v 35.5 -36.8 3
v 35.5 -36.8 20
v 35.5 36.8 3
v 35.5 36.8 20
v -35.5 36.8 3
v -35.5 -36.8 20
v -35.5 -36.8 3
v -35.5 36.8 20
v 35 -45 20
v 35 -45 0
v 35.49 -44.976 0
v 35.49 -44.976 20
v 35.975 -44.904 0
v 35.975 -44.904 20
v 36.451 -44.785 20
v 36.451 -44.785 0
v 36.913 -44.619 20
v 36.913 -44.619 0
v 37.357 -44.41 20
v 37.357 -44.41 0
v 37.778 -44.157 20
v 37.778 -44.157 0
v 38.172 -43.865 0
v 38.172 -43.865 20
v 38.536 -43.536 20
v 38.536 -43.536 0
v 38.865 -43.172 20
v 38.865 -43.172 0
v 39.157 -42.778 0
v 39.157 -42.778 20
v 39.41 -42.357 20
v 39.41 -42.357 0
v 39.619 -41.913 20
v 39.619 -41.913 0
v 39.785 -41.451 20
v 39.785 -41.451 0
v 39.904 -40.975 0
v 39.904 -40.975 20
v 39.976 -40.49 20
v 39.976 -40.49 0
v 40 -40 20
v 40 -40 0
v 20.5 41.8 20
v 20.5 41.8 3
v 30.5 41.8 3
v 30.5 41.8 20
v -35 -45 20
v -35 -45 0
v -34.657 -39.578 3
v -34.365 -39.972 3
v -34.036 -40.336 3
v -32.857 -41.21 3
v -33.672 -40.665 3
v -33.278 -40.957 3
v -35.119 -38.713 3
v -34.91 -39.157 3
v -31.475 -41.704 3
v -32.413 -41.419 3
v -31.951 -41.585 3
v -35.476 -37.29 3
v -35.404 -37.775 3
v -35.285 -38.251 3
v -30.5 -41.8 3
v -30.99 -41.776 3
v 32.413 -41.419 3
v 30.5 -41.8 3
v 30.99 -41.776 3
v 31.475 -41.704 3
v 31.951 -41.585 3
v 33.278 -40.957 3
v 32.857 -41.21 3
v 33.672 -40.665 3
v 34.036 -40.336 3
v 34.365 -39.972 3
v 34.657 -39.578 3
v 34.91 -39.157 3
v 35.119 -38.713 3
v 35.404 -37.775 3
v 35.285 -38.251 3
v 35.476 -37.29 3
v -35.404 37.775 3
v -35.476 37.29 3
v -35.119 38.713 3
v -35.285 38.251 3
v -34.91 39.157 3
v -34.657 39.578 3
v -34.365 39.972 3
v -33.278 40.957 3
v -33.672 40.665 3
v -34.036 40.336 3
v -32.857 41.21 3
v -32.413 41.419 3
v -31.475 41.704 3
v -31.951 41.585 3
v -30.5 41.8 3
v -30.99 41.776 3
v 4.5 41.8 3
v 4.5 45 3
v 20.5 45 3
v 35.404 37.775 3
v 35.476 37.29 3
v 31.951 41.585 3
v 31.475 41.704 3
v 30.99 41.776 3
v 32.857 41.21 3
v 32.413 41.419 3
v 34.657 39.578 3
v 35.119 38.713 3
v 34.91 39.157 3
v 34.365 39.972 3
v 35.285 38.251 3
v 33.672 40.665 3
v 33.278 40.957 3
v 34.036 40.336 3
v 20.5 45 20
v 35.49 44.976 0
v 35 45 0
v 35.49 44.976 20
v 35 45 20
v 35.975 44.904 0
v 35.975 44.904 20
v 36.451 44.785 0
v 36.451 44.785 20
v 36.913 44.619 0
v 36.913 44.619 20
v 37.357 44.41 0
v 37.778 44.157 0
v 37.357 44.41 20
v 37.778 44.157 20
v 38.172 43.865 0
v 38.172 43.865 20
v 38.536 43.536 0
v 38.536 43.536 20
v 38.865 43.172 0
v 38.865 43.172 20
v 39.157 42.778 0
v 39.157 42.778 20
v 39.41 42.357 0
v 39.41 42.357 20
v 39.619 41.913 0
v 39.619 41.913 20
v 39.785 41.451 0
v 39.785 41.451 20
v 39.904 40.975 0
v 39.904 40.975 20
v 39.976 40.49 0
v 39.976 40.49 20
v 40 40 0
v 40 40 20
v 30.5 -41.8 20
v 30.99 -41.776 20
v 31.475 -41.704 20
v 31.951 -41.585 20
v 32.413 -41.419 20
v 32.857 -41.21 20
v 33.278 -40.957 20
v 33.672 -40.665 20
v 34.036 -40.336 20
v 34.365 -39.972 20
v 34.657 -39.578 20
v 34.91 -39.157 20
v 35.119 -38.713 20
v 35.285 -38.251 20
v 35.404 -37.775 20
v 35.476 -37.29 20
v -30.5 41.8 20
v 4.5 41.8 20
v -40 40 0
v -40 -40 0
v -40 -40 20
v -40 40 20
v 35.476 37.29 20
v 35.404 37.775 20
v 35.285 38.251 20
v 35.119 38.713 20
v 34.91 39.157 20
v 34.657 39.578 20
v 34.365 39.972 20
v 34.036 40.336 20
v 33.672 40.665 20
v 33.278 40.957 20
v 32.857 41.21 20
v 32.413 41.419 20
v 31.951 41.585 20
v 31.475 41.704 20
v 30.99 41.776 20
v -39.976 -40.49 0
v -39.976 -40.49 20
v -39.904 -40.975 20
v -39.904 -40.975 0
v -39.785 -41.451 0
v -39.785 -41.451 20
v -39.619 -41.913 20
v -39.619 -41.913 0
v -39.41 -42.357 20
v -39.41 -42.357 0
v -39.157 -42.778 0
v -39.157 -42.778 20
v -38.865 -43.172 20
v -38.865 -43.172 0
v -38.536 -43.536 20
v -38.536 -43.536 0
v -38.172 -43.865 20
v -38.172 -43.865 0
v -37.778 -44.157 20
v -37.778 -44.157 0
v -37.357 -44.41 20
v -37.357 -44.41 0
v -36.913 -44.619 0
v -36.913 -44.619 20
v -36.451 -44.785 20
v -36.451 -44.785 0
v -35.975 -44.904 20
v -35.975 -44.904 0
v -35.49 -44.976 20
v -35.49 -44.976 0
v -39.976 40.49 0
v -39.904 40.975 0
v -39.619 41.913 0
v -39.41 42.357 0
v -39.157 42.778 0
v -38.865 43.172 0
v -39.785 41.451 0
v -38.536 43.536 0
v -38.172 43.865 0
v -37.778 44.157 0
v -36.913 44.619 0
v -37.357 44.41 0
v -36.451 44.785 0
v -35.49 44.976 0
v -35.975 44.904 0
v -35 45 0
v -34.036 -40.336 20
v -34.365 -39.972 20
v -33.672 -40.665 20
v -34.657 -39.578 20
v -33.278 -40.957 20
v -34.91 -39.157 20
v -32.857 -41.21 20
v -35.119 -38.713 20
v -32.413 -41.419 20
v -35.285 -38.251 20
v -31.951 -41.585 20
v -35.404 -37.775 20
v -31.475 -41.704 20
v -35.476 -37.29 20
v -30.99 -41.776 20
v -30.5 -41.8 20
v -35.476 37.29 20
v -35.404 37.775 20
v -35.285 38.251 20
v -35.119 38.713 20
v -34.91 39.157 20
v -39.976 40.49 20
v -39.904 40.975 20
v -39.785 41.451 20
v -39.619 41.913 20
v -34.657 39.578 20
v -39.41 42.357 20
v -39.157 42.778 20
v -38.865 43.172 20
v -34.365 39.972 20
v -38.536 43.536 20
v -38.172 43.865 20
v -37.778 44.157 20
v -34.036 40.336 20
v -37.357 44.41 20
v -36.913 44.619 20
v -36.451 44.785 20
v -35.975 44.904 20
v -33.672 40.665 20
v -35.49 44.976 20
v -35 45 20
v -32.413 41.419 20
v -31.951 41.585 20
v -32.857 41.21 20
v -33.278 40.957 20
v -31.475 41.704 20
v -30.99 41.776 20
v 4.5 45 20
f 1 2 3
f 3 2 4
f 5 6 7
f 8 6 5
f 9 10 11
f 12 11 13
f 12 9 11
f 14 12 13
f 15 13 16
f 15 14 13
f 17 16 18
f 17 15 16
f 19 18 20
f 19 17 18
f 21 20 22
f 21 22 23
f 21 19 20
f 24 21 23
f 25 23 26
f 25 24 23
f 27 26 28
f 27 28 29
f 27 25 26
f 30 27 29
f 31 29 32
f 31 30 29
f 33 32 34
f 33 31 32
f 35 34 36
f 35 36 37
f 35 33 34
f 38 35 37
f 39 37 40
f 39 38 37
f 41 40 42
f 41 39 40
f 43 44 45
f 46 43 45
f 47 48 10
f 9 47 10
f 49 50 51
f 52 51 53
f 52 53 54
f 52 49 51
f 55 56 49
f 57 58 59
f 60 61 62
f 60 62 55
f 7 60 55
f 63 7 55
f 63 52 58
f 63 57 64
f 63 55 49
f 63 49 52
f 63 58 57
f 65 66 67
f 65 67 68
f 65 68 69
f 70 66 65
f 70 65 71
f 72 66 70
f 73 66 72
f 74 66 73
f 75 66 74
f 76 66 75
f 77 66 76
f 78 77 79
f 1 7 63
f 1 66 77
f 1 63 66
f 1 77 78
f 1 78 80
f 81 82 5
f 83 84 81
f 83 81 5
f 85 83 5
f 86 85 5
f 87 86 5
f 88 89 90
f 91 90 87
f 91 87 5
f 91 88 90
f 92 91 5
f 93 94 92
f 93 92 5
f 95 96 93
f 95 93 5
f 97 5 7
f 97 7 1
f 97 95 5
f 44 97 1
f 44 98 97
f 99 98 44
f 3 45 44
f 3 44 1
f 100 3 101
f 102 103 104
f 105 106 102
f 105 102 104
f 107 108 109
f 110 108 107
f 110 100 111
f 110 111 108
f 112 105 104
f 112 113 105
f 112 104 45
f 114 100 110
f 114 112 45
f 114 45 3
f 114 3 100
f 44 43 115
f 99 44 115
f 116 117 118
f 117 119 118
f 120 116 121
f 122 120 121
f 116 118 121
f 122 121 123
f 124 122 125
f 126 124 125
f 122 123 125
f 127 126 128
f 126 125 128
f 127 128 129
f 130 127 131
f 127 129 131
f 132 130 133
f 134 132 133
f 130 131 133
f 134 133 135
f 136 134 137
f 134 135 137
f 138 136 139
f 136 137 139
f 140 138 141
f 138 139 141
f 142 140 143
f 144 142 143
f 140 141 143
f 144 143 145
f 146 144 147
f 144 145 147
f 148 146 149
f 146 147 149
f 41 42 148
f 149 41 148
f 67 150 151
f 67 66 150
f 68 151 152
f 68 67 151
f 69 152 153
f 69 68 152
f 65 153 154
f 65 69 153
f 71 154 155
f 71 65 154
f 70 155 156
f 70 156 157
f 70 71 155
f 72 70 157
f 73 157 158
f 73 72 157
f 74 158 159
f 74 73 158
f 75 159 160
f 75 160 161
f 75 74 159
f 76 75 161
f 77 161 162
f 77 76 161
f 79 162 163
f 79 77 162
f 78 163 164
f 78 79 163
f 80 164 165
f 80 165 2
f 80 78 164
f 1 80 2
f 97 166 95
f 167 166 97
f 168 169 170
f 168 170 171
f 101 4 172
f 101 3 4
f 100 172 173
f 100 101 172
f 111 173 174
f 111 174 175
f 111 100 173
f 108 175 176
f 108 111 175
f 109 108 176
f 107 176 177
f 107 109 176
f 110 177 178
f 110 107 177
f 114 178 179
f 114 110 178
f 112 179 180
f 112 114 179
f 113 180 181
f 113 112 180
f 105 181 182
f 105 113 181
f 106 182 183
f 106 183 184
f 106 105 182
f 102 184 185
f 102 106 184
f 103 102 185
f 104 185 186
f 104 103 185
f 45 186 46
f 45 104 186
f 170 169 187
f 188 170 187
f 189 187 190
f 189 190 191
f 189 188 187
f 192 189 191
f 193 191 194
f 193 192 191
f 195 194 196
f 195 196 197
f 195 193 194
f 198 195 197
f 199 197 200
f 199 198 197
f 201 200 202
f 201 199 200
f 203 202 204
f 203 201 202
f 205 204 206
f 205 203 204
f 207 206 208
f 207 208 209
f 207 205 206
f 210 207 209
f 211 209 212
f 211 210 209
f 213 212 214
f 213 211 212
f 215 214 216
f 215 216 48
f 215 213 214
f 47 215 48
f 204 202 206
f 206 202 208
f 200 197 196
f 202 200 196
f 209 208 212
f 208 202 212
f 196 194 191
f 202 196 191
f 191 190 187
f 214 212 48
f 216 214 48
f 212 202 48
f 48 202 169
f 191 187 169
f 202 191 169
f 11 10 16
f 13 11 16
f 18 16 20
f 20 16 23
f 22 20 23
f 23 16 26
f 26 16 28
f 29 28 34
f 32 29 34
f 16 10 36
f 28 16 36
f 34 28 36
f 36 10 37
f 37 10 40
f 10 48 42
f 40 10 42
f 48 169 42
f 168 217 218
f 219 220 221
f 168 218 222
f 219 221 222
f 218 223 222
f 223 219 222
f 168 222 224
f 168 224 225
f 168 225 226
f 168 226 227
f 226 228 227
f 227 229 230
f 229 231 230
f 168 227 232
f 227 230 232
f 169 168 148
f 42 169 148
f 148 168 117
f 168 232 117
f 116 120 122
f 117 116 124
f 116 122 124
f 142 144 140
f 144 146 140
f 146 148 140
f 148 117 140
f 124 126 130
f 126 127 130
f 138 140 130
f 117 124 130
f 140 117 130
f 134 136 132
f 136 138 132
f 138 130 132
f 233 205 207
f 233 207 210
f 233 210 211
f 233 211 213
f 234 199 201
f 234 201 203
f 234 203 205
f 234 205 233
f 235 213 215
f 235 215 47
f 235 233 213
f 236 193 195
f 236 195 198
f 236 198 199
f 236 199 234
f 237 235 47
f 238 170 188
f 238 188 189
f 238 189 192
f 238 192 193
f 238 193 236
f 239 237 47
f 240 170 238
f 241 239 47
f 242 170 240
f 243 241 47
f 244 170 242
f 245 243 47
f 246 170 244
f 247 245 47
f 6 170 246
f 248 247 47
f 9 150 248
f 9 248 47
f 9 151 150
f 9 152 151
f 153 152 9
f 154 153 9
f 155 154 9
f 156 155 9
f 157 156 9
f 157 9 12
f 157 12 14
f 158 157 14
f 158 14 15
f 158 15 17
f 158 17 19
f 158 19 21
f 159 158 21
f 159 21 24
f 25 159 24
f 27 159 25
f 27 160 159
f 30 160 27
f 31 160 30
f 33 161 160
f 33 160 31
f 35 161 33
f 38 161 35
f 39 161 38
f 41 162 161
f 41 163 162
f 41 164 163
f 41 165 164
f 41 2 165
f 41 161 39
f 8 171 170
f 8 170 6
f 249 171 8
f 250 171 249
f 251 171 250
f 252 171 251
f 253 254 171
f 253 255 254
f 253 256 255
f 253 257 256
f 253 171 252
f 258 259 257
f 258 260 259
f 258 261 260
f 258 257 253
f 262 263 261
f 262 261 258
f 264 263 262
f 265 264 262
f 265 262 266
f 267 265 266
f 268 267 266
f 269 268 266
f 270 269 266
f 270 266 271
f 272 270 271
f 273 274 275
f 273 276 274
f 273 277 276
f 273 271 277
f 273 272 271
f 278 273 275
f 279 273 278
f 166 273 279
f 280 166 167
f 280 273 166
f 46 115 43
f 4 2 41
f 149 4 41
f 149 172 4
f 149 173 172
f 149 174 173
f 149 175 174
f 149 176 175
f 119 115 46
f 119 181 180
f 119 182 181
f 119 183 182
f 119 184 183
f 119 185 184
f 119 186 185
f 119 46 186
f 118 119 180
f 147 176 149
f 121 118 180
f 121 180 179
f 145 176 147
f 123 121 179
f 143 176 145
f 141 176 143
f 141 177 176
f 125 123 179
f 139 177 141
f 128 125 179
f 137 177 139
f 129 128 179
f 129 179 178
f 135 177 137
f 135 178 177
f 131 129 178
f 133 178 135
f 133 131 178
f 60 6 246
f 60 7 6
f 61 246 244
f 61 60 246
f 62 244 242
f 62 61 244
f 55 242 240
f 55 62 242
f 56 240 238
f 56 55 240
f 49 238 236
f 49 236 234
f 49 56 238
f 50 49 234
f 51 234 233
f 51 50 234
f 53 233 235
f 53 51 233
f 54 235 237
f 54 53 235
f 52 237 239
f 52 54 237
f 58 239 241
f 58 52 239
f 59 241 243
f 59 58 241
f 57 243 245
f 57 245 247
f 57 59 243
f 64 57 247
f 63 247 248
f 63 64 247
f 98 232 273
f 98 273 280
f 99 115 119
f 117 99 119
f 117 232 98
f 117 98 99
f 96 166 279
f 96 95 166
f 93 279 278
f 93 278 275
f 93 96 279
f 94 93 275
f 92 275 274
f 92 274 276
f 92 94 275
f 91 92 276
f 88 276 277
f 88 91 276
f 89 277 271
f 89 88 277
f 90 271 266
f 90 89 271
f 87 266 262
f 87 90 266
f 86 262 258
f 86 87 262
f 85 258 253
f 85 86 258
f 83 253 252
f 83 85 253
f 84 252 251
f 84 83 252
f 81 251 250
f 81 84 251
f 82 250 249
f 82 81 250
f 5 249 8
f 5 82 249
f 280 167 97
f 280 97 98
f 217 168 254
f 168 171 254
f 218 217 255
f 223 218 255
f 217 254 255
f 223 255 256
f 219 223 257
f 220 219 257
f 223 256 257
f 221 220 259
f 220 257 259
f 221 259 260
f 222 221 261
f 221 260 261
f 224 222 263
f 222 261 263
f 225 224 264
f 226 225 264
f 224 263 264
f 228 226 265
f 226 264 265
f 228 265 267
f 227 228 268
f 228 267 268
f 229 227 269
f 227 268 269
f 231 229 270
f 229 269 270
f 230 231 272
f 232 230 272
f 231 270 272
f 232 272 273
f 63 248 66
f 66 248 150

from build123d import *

# Parameters (mm, degrees)
F0_W     = 80
F0_H     = 90
F1_DEPTH = 20
F2_W     = 71
F2_H     = 83.6
F3_DEPTH = 17
F4_W     = 16
F4_H     = 3.2
F5_DEPTH = 17
F6_R     = 5
F7_R     = 5


with BuildPart() as f1:
    # F0 (on Top) → F1 (new body)
    with BuildSketch(Plane.XY):
        Rectangle(F0_W, F0_H)
    extrude(amount=F1_DEPTH)

    # F2 (on face) → F3 (cut)
    with BuildSketch(Plane.XY.offset(20)):
        Rectangle(F2_W, F2_H)
    extrude(amount=-F3_DEPTH, mode=Mode.SUBTRACT)

    # F4 (on face) → F5 (cut, through all)
    with BuildSketch(Plane.XY.offset(20)):
        with Locations((12.5, 43.4)):
            Rectangle(F4_W, F4_H)
    extrude(amount=-F5_DEPTH, mode=Mode.SUBTRACT)

    # F6
    f6_edges = [f1.edges().sort_by_distance(p)[0] for p in [
        (40, 45, 10),
        (40, -45, 10),
        (-40, -45, 10),
        (-40, 45, 10),
    ]]
    fillet(f6_edges, radius=F6_R)

    # F7
    f7_edges = [f1.edges().sort_by_distance(p)[0] for p in [
        (35.5, -41.8, 11.5),
        (35.5, 41.8, 11.5),
        (-35.5, 41.8, 11.5),
        (-35.5, -41.8, 11.5),
    ]]
    fillet(f7_edges, radius=F7_R)


solid = f1.part
